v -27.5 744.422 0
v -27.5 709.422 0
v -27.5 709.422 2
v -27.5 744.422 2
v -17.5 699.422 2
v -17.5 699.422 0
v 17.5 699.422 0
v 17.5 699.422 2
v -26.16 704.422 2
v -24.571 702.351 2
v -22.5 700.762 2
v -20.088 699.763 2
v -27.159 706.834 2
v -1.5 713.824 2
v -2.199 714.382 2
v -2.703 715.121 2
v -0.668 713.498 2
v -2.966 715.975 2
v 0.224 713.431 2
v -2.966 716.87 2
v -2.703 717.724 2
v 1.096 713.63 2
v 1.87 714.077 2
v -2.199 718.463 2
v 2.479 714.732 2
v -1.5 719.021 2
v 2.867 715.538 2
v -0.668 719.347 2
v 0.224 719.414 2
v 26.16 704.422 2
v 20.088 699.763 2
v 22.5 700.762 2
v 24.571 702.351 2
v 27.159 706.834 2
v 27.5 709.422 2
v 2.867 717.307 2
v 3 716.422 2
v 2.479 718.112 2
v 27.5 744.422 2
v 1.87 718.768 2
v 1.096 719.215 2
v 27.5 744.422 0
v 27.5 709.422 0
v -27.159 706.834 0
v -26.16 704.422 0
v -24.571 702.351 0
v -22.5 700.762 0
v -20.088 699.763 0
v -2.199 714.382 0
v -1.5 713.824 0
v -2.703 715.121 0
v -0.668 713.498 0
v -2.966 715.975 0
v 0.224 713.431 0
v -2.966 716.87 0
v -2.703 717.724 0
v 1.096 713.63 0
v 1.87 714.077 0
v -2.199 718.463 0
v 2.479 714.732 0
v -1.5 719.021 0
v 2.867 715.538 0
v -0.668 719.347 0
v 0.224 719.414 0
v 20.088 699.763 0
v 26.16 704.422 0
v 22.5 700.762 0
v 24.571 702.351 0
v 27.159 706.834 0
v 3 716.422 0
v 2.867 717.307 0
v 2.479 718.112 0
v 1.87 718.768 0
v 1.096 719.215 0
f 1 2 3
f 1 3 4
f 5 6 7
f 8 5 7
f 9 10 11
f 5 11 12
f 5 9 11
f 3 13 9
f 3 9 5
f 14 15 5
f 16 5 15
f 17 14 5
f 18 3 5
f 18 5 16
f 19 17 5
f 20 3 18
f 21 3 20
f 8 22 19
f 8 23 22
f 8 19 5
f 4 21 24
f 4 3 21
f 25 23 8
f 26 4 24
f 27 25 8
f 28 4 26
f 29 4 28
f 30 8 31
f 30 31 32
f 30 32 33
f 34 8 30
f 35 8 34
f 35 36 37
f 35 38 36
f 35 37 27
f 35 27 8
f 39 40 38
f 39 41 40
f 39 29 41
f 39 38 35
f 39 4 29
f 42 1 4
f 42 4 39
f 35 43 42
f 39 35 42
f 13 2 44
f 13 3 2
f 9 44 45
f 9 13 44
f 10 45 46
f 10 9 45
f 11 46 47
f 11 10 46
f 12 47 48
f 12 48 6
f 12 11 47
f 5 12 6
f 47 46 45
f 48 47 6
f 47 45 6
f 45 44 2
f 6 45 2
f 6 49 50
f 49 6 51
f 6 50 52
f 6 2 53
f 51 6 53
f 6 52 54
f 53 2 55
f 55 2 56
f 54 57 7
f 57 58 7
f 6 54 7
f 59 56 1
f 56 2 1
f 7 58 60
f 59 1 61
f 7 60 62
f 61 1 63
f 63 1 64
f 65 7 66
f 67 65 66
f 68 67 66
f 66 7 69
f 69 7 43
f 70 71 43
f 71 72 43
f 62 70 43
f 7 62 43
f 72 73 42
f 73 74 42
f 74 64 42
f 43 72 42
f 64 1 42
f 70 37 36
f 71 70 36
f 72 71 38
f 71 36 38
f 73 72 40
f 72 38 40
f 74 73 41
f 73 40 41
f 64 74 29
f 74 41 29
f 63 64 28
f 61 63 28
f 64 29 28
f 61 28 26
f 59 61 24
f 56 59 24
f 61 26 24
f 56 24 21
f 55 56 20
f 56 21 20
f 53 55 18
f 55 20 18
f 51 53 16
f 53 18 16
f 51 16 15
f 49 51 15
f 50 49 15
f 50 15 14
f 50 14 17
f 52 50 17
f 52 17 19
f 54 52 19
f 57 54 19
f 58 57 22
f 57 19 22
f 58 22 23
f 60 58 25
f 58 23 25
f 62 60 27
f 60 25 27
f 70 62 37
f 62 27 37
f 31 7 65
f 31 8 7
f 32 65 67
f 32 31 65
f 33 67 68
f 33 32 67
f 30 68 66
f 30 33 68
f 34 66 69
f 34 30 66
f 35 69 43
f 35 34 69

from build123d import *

# Parameters (mm, degrees)
SZKIC1_W                    = 55
SZKIC1_H                    = 45
DODANIE_WYCI_GNI_CIE1_DEPTH = 2
ZAOKR_GLENIE1_R             = 10
ZAOKR_GLENIE2_R             = 10
SZKIC2_R                    = 3
WYTNIJ_WYCI_GNI_CIE2_DEPTH  = 2


with BuildPart() as part:
    # Szkic1 → Dodanie-wyciągnięcie1 (new body)
    with BuildSketch(Plane.XY):
        with Locations((0, 721.92245047)):
            Rectangle(SZKIC1_W, SZKIC1_H)
    extrude(amount=DODANIE_WYCI_GNI_CIE1_DEPTH)

    # Zaokrąglenie1
    zaokr_glenie1_edges = [part.edges().sort_by_distance(p)[0] for p in [
        (-27.5, 699.42245047, 1),
    ]]
    fillet(zaokr_glenie1_edges, radius=ZAOKR_GLENIE1_R)

    # Zaokrąglenie2
    zaokr_glenie2_edges = [part.edges().sort_by_distance(p)[0] for p in [
        (27.5, 699.42245047, 1),
    ]]
    fillet(zaokr_glenie2_edges, radius=ZAOKR_GLENIE2_R)

    # Szkic2 → Wytnij-wyciągnięcie2 (cut)
    with BuildSketch(Plane.XY.offset(2)):
        with Locations((0, 716.42245047)):
            Circle(SZKIC2_R)
    extrude(amount=-WYTNIJ_WYCI_GNI_CIE2_DEPTH, mode=Mode.SUBTRACT)


solid = part.part
